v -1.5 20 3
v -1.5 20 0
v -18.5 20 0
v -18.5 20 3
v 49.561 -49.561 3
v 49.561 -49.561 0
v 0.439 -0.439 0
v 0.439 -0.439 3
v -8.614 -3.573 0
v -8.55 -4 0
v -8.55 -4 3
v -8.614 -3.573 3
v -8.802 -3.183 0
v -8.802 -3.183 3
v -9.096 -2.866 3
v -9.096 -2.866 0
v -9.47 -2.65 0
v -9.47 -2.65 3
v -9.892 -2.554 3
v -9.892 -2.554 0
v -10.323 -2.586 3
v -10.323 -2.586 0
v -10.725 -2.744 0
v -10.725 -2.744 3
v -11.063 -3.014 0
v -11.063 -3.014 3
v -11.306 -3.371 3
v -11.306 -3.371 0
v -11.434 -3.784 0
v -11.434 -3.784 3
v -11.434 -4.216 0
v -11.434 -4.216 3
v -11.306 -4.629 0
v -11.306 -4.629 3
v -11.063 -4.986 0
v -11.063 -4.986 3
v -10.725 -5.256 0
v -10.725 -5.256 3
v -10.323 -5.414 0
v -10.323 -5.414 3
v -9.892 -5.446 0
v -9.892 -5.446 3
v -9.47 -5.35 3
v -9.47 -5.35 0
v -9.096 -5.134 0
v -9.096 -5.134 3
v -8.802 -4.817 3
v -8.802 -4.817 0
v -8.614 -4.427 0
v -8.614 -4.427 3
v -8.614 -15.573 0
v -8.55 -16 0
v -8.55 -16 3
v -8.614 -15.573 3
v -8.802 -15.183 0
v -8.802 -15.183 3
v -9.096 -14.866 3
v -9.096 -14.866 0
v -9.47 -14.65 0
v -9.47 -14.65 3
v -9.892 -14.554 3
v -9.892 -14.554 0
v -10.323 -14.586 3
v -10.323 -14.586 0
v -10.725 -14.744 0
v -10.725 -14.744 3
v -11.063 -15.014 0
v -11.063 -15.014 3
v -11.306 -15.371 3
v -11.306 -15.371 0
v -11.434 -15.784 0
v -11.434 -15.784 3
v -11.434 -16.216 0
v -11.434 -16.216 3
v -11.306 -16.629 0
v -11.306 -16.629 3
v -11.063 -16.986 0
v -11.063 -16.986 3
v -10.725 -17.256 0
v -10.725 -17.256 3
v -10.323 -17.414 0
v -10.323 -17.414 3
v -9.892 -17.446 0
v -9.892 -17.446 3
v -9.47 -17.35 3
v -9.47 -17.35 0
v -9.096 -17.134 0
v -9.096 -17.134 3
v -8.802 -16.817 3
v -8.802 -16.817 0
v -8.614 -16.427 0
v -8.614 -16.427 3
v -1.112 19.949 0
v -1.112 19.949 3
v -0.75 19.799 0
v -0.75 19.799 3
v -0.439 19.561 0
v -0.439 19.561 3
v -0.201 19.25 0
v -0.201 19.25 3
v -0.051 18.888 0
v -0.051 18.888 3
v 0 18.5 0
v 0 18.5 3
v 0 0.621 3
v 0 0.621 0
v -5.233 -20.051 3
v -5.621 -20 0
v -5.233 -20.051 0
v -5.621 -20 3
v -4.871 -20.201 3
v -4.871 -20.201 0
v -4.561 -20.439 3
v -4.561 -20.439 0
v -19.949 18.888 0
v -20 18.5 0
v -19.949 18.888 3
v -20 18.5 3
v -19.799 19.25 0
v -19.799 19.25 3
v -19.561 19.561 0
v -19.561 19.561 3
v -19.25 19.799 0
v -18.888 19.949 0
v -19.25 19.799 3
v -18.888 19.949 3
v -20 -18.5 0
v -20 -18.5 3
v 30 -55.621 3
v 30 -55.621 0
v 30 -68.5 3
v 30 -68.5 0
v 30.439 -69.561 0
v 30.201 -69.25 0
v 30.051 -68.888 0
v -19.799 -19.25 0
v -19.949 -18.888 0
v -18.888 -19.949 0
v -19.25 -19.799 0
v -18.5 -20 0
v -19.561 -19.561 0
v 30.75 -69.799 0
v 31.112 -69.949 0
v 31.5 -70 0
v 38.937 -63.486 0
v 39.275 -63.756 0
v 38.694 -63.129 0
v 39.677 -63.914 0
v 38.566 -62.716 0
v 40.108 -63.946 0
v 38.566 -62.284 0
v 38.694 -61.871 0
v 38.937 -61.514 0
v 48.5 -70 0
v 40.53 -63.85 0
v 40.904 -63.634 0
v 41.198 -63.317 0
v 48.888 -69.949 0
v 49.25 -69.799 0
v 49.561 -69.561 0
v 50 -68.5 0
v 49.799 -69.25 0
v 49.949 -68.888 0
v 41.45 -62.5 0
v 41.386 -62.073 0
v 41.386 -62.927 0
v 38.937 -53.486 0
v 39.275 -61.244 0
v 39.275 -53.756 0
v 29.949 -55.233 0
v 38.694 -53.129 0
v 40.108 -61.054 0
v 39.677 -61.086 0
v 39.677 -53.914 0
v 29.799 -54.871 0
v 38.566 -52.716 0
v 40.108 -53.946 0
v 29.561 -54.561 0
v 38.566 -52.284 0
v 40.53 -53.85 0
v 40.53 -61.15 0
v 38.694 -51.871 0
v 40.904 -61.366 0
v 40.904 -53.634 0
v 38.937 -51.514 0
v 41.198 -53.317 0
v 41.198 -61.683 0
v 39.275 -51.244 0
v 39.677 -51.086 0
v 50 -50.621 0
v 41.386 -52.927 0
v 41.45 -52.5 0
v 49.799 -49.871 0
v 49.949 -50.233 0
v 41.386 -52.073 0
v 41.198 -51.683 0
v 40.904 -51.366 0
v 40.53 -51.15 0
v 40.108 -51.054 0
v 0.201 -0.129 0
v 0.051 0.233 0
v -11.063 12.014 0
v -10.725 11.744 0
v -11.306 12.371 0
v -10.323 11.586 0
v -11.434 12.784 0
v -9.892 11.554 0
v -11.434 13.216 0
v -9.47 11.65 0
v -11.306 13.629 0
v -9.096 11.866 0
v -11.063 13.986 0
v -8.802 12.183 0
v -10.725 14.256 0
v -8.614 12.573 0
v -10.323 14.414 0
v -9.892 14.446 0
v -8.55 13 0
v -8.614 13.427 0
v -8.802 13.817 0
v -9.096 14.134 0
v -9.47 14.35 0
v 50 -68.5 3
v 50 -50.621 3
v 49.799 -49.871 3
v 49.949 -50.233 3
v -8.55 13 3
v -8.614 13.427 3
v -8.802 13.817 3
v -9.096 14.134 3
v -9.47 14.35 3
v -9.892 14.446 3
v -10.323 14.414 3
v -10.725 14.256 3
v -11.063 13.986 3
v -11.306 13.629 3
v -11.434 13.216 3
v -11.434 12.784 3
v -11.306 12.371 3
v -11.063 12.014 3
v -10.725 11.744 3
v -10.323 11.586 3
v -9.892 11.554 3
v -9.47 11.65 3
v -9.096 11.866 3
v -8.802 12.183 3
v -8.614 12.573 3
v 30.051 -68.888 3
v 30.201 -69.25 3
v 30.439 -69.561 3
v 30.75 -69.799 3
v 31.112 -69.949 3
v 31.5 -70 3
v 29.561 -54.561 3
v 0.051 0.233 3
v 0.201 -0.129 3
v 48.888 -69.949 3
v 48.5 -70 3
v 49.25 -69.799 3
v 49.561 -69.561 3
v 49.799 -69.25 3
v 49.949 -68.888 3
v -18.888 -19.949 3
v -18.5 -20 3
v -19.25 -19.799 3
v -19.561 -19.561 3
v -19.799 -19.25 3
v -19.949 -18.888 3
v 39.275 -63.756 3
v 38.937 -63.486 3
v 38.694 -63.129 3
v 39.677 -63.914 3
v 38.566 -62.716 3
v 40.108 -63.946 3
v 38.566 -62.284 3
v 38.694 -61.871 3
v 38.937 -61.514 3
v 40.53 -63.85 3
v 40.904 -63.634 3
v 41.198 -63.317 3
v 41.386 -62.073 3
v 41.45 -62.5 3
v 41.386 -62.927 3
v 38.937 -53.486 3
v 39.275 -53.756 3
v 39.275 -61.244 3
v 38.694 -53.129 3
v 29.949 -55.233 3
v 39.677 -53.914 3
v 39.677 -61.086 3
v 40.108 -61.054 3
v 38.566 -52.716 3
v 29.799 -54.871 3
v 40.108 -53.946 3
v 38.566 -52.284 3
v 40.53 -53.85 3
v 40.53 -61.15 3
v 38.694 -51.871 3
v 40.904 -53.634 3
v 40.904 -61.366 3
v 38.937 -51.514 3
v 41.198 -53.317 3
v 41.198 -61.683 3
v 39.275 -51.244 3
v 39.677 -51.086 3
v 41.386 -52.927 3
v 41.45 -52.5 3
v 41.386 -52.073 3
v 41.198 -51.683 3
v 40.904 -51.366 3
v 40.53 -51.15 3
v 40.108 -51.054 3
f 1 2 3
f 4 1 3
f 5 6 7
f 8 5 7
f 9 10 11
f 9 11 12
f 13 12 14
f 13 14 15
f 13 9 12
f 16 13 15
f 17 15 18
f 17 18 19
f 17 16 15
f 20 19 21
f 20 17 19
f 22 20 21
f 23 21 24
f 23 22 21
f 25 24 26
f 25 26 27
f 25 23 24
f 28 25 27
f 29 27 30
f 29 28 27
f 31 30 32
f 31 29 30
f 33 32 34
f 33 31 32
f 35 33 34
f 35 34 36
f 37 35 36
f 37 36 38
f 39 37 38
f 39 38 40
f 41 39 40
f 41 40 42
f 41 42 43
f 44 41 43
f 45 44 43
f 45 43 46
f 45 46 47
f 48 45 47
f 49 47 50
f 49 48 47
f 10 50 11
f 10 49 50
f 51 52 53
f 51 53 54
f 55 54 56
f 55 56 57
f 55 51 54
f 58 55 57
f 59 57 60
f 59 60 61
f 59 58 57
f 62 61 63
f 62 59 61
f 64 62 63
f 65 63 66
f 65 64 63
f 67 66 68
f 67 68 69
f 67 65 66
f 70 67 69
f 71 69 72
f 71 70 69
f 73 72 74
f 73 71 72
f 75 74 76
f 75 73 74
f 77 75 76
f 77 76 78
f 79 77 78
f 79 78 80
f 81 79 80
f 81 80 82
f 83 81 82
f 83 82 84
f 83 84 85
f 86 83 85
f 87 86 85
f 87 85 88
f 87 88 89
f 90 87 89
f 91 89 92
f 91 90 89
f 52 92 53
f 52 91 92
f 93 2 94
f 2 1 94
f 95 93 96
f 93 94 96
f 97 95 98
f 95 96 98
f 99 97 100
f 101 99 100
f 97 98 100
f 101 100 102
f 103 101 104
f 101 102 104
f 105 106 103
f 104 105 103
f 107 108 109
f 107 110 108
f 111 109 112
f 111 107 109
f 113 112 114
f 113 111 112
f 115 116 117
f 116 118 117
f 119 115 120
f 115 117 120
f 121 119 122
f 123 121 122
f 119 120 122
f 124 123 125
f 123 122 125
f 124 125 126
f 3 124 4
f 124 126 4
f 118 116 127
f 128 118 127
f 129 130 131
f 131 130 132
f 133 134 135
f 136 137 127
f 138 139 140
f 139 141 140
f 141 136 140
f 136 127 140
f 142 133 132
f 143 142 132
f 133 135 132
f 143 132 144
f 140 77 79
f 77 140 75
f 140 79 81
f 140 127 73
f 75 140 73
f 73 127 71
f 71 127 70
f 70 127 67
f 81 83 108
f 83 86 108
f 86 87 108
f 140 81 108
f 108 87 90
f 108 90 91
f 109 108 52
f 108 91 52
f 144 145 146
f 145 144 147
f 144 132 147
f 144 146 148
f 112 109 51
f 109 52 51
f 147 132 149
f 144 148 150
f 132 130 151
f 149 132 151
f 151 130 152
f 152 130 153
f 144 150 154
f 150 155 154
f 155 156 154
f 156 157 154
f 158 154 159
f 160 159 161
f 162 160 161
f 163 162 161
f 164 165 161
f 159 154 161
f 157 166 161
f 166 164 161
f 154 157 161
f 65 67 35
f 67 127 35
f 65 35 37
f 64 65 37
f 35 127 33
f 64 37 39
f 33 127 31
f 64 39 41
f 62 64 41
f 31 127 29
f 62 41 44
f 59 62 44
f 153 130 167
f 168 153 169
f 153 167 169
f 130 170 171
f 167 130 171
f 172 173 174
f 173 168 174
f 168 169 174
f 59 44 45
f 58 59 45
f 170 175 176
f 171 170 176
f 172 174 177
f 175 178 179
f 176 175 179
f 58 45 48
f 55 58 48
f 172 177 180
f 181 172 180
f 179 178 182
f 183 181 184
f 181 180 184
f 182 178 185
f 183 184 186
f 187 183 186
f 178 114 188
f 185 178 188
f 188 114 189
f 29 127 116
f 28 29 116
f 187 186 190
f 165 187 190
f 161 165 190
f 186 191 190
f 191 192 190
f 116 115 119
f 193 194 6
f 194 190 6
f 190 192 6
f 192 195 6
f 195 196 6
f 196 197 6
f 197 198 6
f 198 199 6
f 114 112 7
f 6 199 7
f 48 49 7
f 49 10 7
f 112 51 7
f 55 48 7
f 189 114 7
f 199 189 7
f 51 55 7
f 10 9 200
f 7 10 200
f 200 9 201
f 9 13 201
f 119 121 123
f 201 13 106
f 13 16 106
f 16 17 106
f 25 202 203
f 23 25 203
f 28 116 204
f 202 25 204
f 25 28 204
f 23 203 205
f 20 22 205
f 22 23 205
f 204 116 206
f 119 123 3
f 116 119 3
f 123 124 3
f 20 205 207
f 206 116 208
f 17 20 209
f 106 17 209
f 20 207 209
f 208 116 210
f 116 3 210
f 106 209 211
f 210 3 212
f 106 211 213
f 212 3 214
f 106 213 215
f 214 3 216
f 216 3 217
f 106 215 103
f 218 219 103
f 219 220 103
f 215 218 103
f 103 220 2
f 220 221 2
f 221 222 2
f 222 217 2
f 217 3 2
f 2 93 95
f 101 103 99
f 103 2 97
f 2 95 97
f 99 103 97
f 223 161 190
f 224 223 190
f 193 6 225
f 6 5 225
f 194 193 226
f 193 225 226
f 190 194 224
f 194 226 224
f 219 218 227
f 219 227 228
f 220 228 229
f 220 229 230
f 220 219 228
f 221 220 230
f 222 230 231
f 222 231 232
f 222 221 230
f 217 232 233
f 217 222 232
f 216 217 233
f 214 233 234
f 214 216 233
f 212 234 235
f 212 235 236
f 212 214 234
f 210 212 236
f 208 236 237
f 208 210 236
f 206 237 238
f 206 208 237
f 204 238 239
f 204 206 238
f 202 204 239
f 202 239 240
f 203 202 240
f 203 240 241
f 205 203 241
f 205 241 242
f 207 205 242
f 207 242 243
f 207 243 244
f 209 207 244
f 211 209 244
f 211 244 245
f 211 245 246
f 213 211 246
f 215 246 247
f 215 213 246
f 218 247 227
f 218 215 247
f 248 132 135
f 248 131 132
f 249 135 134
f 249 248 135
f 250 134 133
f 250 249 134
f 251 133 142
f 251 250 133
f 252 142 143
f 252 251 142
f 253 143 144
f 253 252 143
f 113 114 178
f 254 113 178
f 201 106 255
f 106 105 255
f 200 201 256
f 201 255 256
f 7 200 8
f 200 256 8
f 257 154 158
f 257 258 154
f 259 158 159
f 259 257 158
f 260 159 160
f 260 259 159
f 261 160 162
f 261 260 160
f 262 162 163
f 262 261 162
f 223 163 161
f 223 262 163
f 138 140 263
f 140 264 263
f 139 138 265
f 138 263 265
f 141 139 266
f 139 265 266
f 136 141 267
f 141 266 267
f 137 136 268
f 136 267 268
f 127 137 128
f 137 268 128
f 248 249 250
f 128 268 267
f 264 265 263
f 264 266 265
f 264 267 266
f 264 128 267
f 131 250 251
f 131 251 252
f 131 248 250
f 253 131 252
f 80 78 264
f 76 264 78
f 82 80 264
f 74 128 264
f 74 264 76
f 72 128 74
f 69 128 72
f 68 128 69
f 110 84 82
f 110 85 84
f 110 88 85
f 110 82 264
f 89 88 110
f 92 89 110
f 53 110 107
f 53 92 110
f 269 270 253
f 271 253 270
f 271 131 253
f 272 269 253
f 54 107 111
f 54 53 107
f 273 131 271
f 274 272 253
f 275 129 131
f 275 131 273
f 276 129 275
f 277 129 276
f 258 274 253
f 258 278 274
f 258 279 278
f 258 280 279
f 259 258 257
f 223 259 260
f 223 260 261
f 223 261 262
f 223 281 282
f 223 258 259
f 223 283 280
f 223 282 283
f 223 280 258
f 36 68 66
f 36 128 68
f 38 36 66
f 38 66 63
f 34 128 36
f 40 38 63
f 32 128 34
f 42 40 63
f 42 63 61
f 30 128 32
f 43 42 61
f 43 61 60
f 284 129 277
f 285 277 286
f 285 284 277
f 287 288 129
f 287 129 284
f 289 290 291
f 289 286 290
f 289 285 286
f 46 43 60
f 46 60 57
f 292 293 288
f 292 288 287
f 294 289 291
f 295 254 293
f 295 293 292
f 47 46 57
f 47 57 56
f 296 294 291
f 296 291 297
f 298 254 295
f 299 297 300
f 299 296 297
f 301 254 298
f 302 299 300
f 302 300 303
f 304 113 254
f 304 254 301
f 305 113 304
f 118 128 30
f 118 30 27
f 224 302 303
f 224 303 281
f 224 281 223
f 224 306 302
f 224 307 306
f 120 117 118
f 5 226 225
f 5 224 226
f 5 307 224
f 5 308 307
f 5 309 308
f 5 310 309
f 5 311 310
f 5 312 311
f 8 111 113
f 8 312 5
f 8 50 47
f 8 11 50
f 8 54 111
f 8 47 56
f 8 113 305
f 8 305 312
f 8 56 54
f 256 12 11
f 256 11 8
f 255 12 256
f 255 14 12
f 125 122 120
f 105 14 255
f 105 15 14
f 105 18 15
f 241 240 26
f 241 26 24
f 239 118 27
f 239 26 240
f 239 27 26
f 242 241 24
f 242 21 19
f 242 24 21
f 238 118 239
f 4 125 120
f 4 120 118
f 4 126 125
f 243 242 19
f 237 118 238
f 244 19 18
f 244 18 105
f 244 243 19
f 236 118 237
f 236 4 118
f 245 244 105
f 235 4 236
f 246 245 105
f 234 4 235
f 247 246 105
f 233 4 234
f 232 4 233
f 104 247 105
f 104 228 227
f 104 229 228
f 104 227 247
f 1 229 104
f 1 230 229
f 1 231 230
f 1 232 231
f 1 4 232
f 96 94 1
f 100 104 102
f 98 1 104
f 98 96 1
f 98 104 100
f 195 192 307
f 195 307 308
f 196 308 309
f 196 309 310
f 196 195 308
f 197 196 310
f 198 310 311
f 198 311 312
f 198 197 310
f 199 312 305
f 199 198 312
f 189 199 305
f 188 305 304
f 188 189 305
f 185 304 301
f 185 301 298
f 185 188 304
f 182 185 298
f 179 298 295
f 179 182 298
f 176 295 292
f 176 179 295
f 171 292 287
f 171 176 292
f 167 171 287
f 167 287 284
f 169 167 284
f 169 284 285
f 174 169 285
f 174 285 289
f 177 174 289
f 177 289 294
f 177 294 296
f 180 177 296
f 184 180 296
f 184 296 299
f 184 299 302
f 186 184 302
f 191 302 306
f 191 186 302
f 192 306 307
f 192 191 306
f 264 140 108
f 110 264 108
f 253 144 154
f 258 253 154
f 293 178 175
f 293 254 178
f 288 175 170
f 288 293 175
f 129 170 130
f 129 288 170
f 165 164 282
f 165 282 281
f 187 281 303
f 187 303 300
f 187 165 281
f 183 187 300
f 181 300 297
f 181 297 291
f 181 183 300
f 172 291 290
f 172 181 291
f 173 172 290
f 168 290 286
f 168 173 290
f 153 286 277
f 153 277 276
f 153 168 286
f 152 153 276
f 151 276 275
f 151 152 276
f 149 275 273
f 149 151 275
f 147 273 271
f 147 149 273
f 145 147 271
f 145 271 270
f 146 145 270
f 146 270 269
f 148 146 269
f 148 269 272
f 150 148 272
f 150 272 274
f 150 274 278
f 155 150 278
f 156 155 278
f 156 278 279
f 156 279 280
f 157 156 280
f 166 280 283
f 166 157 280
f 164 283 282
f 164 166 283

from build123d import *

# Parameters (mm, degrees)
SKETCH1_R           = 1.45
BOSS_EXTRUDE1_DEPTH = 3
FILLET1_R           = 1.5


with BuildPart() as part:
    # Sketch1 → Boss-Extrude1 (new body)
    with BuildSketch(Plane.XY):
        Polygon((-20, -20), (-5, -20), (30, -55), (30, -70), (50, -70), (50, -50), (0, 0), (0, 20), (-20, 20), (-20, 0), align=None)
        with Locations((-10, -16)):
            Circle(SKETCH1_R, mode=Mode.SUBTRACT)
        with Locations((-10, -4)):
            Circle(SKETCH1_R, mode=Mode.SUBTRACT)
        with Locations((40, -52.5)):
            Circle(SKETCH1_R, mode=Mode.SUBTRACT)
        with Locations((40, -62.5)):
            Circle(SKETCH1_R, mode=Mode.SUBTRACT)
        with Locations((-10, 13)):
            Circle(SKETCH1_R, mode=Mode.SUBTRACT)
    extrude(amount=BOSS_EXTRUDE1_DEPTH)

    # Fillet1
    fillet1_edges = [part.edges().sort_by_distance(p)[0] for p in [
        (-20, 20, 1.5),
        (0, 20, 1.5),
        (0, 0, 1.5),
        (50, -50, 1.5),
        (50, -70, 1.5),
        (30, -70, 1.5),
        (30, -55, 1.5),
        (-5, -20, 1.5),
        (-20, -20, 1.5),
    ]]
    fillet(fillet1_edges, radius=FILLET1_R)


solid = part.part
